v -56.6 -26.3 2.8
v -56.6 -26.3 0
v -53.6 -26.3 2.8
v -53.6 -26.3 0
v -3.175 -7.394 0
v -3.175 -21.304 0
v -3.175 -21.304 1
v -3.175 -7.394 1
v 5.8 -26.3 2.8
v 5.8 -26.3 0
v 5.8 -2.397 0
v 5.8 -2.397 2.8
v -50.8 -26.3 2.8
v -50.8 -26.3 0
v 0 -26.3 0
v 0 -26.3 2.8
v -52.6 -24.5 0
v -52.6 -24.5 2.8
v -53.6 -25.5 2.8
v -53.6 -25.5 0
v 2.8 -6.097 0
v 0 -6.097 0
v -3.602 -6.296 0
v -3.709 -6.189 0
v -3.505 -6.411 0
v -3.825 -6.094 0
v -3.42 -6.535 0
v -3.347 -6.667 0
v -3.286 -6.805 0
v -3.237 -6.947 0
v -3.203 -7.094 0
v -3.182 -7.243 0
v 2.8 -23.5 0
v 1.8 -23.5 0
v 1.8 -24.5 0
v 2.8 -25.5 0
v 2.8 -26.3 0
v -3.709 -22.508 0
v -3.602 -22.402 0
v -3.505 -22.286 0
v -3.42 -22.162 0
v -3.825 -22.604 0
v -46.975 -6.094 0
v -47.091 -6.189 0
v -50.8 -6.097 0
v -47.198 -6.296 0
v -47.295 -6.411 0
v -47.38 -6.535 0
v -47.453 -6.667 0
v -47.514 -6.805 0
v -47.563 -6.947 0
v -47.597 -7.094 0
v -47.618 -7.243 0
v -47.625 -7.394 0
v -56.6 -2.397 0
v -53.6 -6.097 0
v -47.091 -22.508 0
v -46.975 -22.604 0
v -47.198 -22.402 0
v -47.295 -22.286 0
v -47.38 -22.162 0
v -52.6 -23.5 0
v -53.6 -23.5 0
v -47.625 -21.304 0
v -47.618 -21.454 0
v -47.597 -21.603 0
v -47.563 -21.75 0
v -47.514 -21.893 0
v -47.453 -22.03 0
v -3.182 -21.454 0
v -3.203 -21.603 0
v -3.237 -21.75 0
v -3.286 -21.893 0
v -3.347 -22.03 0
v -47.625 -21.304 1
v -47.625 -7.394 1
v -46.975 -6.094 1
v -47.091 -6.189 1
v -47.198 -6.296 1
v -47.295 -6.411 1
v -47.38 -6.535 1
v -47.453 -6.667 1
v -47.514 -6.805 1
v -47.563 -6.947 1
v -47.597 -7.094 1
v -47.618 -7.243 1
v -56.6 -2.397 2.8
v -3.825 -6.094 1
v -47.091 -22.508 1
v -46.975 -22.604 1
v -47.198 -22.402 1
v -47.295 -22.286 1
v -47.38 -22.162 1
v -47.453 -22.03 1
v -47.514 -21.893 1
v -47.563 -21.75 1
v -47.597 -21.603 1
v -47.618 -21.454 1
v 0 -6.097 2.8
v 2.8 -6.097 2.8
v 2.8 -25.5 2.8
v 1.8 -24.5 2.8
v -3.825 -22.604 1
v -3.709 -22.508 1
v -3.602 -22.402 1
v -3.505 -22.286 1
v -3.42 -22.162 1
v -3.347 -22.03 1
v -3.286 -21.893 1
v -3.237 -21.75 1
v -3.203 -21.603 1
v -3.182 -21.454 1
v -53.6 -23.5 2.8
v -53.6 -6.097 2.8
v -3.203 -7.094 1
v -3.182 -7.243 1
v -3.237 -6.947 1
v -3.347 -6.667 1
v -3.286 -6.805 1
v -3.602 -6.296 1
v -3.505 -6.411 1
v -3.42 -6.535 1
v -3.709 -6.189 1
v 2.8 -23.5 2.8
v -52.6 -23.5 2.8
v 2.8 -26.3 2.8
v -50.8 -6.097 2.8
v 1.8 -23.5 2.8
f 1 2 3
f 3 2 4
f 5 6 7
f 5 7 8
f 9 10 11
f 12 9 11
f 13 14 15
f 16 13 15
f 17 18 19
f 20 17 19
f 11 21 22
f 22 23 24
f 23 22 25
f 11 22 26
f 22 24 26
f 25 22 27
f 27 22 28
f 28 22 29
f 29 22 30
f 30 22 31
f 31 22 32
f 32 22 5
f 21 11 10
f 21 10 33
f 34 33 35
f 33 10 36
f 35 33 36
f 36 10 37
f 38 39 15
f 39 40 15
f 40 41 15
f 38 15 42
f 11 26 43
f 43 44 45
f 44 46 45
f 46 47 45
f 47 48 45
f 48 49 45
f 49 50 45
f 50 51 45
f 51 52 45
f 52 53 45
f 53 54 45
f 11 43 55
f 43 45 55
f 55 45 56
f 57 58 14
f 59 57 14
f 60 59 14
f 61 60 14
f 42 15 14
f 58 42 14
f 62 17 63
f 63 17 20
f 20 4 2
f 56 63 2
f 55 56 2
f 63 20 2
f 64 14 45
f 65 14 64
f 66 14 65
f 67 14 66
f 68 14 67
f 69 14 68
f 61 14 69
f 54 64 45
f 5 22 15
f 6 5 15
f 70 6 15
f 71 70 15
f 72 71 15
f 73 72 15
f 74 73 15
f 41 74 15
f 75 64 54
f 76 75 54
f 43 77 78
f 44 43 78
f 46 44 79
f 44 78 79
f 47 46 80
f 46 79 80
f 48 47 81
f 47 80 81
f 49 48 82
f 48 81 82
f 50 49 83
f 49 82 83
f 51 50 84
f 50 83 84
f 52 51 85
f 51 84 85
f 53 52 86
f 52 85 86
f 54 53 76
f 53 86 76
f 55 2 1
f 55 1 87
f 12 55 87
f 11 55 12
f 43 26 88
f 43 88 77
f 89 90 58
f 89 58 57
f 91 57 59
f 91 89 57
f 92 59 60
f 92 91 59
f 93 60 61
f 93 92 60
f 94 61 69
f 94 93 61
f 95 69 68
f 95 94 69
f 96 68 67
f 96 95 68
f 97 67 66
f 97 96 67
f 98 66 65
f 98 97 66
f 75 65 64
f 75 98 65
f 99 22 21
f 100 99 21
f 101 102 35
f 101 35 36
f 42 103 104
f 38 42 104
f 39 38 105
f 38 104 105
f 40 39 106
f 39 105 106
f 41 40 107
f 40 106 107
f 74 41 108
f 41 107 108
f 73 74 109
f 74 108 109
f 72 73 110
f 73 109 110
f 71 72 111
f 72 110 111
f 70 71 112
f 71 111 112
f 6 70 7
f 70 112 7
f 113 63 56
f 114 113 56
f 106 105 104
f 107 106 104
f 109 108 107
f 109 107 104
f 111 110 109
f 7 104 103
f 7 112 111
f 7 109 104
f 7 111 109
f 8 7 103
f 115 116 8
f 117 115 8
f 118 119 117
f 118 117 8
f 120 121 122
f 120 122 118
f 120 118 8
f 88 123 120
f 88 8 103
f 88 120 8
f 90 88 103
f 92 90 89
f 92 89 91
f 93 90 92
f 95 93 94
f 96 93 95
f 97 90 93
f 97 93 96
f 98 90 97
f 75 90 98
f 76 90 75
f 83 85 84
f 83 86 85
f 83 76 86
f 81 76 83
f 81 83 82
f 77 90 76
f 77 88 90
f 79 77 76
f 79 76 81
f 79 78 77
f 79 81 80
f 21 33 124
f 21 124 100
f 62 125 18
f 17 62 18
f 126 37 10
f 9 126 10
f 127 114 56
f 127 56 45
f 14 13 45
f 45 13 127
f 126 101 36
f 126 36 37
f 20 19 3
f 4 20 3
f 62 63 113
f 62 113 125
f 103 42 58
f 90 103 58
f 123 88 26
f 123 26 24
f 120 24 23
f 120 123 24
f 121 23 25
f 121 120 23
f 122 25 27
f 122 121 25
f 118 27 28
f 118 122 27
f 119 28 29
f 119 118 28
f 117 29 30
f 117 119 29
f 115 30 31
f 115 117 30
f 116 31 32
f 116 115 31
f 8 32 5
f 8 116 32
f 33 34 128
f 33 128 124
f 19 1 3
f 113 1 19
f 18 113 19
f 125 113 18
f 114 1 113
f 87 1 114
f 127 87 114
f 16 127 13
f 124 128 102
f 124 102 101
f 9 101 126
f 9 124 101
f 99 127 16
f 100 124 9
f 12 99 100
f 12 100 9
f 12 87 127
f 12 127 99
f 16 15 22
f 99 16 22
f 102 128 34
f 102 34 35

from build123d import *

# Parameters (mm, degrees)
SKETCH1_W                                = 62.4
SKETCH1_H                                = 23.902256307
SKETCH1_W_2                              = 2.8
SKETCH1_H_2                              = 17.402256307
BOSS_EXTRUDE1_DEPTH                      = 2.8
CUT_EXTRUDE1_DEPTH                       = 3.8
SKETCH4_W                                = 44.45
SKETCH4_H                                = 16.51
CUT_EXTRUDE2_DEPTH                       = 1
BOSS_EXTRUDE2_DEPTH                      = 1
MIRROR2_AT_THE_SECOND_PLANE_COPY_1_DEPTH = 1


with BuildPart() as part:
    # Sketch1 → Boss-Extrude1 (new body)
    with BuildSketch(Plane.XY):
        with Locations((-25.4, -14.348584576)):
            Rectangle(SKETCH1_W, SKETCH1_H)
        with Locations((-52.2, -14.798584576)):
            Rectangle(SKETCH1_W_2, SKETCH1_H_2, mode=Mode.SUBTRACT)
        with Locations((1.4, -14.798584576)):
            Rectangle(SKETCH1_W_2, SKETCH1_H_2, mode=Mode.SUBTRACT)
    extrude(amount=BOSS_EXTRUDE1_DEPTH)

    # Sketch2 → Cut-Extrude1 (cut, through all)
    with BuildSketch(Plane.XY.offset(2.8)):
        Polygon((-50.8, -23.499712729), (-52.6, -23.499712729), (-52.6, -24.499712729), (-53.6, -25.499712729), (-53.6, -26.299712729), (-50.8, -26.299712729), align=None)
    cut_extrude1 = extrude(amount=-CUT_EXTRUDE1_DEPTH, mode=Mode.SUBTRACT)

    # Mirror1: Cut-Extrude1 across plane
    add(cut_extrude1.mirror(Plane.ZY.offset(25.4)), mode=Mode.SUBTRACT)

    # Sketch4 → Cut-Extrude2 (cut)
    with BuildSketch(Plane(origin=(0, 0, 0), x_dir=(-1, 0, 0), z_dir=(0, 0, -1))):
        with Locations((25.4, -14.348584576)):
            Rectangle(SKETCH4_W, SKETCH4_H)
    extrude(amount=-CUT_EXTRUDE2_DEPTH, mode=Mode.SUBTRACT)

    # Sketch5 → Boss-Extrude2 (add)
    with BuildSketch(Plane(origin=(0, 0, 1), x_dir=(-1, 0, 0), z_dir=(0, 0, -1))):
        with BuildLine():
            Line((3.175, -6.093584576), (3.825, -6.093584576))
            ThreePointArc((3.825, -6.093584576), (3.346555815, -6.666862483), (3.175, -7.393584576))
            Line((3.175, -7.393584576), (3.175, -6.093584576))
        make_face()
    boss_extrude2 = extrude(amount=BOSS_EXTRUDE2_DEPTH)

    # Mirror2: Boss-Extrude2 across plane
    add(boss_extrude2.mirror(Plane.ZY.offset(25.4)))

    # Mirror2 at the second plane: Boss-Extrude2 across plane
    add(boss_extrude2.mirror(Plane.ZX.offset(-14.348584576)))

    # Mirror2 at the second plane copy 1 sketc → Mirror2 at the second plane copy 1 (add)
    with BuildSketch(Plane(origin=(-50.8, -28.697169151, 1), x_dir=(1, 0, 0), z_dir=(0, 0, -1))):
        with BuildLine():
            Line((3.175, -6.093584576), (3.825, -6.093584576))
            ThreePointArc((3.825, -6.093584576), (3.346555815, -6.666862483), (3.175, -7.393584576))
            Line((3.175, -7.393584576), (3.175, -6.093584576))
        make_face()
    extrude(amount=MIRROR2_AT_THE_SECOND_PLANE_COPY_1_DEPTH)


solid = part.part
